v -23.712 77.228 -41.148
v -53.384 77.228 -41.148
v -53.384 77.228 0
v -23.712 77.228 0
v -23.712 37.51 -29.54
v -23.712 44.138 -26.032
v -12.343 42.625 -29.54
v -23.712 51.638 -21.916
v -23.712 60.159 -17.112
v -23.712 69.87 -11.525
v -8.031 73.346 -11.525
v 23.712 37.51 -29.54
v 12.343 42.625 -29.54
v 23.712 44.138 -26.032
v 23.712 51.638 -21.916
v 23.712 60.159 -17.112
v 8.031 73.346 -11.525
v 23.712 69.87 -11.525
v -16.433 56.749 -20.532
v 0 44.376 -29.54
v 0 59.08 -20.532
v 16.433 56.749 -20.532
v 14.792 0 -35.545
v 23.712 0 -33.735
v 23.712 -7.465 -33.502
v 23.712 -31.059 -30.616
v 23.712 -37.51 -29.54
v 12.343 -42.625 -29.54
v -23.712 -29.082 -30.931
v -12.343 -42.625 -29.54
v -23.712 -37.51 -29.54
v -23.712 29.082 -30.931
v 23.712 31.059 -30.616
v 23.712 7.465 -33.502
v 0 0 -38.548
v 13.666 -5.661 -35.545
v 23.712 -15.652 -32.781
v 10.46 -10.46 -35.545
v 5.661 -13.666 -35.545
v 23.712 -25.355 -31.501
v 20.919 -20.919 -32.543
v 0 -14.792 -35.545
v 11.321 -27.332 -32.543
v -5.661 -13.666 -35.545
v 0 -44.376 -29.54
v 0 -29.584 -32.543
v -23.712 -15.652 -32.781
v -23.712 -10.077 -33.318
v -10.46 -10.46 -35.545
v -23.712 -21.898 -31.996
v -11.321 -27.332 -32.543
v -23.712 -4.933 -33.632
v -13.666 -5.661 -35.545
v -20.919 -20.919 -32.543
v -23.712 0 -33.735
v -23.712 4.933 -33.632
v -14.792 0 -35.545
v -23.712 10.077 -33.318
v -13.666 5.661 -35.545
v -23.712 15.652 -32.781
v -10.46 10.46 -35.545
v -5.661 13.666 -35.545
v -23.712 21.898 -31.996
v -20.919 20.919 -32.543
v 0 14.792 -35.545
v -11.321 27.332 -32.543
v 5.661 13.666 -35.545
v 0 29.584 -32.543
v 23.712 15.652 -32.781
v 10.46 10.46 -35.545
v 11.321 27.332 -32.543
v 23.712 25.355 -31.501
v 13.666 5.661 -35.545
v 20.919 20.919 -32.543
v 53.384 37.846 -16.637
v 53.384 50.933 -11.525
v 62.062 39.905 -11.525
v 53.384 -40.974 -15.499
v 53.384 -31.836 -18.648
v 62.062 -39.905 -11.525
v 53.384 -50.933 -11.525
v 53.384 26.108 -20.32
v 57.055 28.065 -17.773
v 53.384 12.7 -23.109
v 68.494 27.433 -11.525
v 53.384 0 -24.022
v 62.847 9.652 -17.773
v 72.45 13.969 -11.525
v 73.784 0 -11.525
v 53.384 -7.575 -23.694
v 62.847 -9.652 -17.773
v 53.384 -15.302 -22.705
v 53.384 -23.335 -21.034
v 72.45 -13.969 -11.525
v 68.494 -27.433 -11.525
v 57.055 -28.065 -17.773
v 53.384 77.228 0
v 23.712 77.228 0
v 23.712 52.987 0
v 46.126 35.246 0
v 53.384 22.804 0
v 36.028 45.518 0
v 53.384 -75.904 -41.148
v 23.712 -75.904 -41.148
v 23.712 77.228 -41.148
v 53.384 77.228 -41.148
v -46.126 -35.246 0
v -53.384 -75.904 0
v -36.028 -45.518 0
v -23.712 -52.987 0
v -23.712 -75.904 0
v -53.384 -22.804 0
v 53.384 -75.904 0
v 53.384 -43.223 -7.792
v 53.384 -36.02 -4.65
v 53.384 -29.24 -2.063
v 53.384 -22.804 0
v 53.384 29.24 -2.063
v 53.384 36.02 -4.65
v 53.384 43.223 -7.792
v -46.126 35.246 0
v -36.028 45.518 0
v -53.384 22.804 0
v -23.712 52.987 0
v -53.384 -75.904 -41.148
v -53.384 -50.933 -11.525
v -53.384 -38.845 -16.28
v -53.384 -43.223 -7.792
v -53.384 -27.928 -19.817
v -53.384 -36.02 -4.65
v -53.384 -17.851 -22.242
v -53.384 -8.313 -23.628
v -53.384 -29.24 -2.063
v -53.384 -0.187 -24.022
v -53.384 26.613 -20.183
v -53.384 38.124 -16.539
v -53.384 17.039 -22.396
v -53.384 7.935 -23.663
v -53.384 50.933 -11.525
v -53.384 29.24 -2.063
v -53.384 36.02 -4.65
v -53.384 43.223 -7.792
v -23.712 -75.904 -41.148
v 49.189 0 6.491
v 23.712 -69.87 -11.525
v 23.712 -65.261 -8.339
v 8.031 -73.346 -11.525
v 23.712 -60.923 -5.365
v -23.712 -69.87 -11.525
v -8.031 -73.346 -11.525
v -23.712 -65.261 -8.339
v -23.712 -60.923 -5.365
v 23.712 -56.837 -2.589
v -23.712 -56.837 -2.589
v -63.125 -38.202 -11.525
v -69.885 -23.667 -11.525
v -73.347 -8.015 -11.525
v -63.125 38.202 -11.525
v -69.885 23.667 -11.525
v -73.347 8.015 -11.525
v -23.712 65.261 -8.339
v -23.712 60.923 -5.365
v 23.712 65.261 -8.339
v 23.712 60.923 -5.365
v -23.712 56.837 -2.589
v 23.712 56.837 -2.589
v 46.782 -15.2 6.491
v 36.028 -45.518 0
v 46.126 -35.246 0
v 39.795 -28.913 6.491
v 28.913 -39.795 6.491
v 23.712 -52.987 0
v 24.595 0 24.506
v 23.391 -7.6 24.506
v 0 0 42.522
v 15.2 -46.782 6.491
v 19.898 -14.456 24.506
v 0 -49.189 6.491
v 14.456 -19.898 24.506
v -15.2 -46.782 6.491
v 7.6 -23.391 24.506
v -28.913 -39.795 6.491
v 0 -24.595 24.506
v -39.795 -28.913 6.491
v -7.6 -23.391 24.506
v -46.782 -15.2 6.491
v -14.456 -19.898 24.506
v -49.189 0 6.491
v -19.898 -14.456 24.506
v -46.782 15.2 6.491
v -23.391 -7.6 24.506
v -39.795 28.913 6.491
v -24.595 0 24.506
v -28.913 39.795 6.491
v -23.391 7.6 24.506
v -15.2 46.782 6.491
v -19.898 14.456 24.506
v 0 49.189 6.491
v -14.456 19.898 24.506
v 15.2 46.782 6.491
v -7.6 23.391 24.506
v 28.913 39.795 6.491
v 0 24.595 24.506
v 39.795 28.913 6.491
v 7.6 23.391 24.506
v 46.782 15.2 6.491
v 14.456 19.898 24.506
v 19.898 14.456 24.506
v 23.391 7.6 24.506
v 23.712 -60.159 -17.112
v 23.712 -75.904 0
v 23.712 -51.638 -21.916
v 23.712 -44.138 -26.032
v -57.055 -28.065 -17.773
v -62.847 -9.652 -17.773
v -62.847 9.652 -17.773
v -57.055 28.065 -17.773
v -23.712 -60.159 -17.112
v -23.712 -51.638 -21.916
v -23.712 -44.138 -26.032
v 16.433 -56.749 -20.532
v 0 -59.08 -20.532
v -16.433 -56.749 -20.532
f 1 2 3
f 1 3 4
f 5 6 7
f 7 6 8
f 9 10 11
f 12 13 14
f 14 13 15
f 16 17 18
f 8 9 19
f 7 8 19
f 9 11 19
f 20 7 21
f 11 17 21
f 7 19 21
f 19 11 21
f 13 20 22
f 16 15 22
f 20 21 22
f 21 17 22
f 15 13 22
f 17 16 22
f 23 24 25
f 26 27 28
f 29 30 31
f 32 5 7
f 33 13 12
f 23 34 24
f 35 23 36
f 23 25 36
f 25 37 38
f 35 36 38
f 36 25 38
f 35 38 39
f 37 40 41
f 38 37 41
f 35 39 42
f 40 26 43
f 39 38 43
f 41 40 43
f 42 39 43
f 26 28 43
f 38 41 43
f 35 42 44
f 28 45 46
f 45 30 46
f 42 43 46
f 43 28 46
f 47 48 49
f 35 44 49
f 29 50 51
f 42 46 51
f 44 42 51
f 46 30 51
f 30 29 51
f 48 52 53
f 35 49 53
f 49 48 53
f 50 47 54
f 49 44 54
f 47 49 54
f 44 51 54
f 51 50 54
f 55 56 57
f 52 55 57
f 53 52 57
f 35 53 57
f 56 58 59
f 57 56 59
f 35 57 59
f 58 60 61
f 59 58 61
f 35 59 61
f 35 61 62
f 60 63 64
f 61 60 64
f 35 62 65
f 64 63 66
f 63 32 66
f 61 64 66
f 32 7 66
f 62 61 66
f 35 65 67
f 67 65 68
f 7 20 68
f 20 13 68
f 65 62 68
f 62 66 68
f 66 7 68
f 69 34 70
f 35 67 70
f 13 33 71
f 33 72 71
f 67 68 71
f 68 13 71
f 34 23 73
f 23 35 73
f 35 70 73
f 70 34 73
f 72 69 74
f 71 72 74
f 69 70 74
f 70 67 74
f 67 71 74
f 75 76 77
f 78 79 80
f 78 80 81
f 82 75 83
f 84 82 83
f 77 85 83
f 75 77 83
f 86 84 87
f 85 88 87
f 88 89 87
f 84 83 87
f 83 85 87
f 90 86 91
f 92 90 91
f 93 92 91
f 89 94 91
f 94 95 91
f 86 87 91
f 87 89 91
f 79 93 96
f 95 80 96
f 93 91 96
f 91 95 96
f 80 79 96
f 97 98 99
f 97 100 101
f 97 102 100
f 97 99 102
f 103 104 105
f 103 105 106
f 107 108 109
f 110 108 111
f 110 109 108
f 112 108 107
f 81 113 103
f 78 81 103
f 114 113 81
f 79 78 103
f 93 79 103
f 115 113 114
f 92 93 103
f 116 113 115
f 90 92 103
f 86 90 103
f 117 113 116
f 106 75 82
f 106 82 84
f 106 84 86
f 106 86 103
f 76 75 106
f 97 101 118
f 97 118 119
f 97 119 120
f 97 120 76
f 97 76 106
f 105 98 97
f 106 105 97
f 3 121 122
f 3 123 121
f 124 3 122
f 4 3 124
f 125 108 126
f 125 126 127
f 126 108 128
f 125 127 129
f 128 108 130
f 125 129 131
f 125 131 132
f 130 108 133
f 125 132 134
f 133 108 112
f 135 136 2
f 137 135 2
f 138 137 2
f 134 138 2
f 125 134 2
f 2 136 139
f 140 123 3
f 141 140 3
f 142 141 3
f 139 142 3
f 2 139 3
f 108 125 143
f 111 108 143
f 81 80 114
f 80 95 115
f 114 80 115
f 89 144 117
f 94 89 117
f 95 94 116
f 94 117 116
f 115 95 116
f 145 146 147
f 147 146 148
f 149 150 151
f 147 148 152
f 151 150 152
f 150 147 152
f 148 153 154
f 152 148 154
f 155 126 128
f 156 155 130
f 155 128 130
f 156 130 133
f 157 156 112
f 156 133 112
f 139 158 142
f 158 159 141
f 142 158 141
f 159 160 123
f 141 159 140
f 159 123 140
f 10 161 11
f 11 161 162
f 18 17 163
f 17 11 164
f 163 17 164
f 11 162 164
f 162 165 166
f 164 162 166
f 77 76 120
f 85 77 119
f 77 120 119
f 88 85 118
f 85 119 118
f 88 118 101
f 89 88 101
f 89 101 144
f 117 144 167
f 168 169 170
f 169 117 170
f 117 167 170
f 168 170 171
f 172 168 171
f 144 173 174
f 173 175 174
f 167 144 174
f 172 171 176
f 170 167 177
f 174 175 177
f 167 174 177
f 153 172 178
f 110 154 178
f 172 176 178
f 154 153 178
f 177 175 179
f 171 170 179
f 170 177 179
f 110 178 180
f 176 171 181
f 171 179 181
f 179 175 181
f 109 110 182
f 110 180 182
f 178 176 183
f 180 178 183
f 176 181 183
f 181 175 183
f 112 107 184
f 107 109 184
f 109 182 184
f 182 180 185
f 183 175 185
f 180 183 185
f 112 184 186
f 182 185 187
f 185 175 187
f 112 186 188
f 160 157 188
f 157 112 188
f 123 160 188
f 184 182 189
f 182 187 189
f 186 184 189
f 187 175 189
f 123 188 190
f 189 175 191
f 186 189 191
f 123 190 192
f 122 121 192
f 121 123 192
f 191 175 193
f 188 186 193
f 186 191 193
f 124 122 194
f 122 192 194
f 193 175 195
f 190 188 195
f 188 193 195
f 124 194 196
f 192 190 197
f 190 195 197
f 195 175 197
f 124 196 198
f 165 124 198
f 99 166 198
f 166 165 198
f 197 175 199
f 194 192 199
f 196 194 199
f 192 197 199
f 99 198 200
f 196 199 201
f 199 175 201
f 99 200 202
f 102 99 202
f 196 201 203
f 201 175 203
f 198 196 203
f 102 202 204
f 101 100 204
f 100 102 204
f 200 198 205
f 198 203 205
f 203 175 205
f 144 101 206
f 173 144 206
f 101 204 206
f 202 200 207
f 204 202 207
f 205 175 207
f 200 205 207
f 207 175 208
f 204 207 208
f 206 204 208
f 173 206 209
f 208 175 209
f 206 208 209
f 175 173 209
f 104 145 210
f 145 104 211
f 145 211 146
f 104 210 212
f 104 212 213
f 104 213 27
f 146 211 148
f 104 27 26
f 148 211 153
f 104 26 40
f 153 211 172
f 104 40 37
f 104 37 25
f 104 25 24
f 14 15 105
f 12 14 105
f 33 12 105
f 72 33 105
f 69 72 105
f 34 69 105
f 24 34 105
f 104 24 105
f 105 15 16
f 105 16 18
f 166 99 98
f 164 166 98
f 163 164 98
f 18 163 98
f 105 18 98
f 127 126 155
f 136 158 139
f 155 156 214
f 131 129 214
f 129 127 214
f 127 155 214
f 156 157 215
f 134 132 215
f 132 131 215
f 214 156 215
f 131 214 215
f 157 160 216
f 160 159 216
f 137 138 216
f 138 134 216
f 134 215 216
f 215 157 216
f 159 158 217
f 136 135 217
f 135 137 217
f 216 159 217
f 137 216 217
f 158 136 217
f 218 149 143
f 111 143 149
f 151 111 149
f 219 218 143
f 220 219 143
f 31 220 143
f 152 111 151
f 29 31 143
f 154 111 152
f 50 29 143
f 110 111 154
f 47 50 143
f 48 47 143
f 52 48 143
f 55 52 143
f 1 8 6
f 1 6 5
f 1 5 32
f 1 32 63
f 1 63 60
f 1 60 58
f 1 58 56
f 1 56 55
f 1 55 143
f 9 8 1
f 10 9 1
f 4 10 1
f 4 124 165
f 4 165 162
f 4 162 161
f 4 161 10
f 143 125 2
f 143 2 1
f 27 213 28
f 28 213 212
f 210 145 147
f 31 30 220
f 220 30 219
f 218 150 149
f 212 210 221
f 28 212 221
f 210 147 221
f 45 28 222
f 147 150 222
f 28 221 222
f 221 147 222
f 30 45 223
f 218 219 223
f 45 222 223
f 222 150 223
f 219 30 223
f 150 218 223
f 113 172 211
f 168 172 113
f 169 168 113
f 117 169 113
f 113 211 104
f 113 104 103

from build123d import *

# Parameters (mm, degrees)
F2_W     = 29.6725835651
F2_H     = 153.1317234039
F3_DEPTH = 41.148


# Not quite as in the source:
# - the program builds the solid bodies; features that only make, move or delete a surface that nothing else refers to are left out


with BuildPart() as f1:
    # F0 (on Front) → F1 (revolve)
    with BuildSketch(Plane.XZ):
        Polygon((0, 42.5218716264), (0, -38.5478623211), (44.3764105439, -29.5401159674), (73.7840533257, -11.5246195346), align=None)
    revolve(axis=Axis((0, 0, 1.9870046526), (0, 0, -1)))

    # F2 (on Top) → F3 (join)
    with BuildSketch(Plane.XY):
        with Locations((-38.5478632525, 0.6623342633)):
            Rectangle(F2_W, F2_H)
        with Locations((38.5478632525, 0.6623342633)):
            Rectangle(F2_W, F2_H)
    extrude(amount=-F3_DEPTH)


solid = f1.part
